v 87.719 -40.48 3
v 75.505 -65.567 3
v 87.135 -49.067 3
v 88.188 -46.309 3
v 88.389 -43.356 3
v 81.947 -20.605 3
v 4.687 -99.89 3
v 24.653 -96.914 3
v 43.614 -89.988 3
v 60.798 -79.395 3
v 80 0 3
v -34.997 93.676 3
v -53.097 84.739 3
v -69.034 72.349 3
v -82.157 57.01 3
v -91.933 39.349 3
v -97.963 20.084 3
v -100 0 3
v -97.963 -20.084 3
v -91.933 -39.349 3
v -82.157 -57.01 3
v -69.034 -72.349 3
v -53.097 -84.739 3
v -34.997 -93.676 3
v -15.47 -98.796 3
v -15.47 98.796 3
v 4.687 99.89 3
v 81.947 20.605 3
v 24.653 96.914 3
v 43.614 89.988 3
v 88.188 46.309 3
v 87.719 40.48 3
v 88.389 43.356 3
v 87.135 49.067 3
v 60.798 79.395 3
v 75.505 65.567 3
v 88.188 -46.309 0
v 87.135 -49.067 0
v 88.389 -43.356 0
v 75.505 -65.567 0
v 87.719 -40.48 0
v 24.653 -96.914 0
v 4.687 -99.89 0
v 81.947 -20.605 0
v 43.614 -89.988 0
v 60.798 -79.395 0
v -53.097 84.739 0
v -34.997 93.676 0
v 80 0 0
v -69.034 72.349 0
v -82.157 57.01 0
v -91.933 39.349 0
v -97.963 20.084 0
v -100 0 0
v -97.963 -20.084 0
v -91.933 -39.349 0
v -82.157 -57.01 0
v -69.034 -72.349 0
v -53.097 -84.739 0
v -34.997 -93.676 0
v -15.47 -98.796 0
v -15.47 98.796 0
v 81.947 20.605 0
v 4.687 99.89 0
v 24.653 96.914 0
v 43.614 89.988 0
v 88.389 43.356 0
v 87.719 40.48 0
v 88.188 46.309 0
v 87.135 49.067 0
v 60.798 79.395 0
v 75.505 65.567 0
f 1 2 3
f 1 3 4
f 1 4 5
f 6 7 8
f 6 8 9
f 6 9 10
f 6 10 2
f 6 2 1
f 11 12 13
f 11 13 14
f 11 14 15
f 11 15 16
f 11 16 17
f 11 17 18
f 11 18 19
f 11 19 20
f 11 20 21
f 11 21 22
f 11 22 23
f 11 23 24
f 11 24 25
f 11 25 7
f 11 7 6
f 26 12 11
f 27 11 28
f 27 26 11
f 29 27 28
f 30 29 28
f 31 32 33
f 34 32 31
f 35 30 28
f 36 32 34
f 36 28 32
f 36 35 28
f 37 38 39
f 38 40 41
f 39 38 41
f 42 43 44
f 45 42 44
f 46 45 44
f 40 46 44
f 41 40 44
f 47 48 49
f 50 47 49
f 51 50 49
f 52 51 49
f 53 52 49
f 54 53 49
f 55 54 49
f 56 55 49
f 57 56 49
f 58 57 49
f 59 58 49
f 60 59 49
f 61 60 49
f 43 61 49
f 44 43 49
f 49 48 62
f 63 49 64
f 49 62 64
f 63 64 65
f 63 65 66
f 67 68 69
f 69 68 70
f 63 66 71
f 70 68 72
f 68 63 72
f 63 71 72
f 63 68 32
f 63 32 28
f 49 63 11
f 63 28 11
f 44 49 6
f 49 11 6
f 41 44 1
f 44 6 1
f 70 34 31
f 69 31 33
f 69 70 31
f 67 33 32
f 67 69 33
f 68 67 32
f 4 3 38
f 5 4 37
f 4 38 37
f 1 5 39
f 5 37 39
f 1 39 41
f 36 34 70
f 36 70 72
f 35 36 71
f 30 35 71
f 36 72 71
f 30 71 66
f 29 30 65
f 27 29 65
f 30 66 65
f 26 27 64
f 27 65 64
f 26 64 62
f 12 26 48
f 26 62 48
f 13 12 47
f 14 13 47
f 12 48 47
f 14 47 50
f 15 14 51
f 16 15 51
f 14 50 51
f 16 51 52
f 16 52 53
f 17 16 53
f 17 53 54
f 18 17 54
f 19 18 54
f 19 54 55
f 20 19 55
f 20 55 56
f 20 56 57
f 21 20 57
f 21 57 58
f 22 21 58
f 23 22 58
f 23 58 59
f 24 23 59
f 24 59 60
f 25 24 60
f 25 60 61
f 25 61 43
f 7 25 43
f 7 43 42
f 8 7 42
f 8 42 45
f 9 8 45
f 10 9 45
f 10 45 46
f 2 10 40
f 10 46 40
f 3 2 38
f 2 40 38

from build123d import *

# Parameters (mm, degrees)
CROQUIS1_R              = 100
SALIENTE_EXTRUIR1_DEPTH = 3
CROQUIS3_R              = 110
CORTAR_EXTRUIR1_DEPTH   = 3
REDONDEO1_R             = 10


with BuildPart() as part:
    # Croquis1 → Saliente-Extruir1 (new body)
    with BuildSketch(Plane.XY):
        Circle(CROQUIS1_R)
    extrude(amount=SALIENTE_EXTRUIR1_DEPTH)

    # Croquis3 → Cortar-Extruir1 (cut)
    with BuildSketch(Plane.XY.offset(3)):
        with Locations((190, 0)):
            Circle(CROQUIS3_R)
    extrude(amount=-CORTAR_EXTRUIR1_DEPTH, mode=Mode.SUBTRACT)

    # Redondeo1
    redondeo1_edges = [part.edges().sort_by_distance(p)[0] for p in [
        (89.473684211, -44.659375654, 1.5),
        (89.473684211, 44.659375654, 1.5),
    ]]
    fillet(redondeo1_edges, radius=REDONDEO1_R)


solid = part.part
